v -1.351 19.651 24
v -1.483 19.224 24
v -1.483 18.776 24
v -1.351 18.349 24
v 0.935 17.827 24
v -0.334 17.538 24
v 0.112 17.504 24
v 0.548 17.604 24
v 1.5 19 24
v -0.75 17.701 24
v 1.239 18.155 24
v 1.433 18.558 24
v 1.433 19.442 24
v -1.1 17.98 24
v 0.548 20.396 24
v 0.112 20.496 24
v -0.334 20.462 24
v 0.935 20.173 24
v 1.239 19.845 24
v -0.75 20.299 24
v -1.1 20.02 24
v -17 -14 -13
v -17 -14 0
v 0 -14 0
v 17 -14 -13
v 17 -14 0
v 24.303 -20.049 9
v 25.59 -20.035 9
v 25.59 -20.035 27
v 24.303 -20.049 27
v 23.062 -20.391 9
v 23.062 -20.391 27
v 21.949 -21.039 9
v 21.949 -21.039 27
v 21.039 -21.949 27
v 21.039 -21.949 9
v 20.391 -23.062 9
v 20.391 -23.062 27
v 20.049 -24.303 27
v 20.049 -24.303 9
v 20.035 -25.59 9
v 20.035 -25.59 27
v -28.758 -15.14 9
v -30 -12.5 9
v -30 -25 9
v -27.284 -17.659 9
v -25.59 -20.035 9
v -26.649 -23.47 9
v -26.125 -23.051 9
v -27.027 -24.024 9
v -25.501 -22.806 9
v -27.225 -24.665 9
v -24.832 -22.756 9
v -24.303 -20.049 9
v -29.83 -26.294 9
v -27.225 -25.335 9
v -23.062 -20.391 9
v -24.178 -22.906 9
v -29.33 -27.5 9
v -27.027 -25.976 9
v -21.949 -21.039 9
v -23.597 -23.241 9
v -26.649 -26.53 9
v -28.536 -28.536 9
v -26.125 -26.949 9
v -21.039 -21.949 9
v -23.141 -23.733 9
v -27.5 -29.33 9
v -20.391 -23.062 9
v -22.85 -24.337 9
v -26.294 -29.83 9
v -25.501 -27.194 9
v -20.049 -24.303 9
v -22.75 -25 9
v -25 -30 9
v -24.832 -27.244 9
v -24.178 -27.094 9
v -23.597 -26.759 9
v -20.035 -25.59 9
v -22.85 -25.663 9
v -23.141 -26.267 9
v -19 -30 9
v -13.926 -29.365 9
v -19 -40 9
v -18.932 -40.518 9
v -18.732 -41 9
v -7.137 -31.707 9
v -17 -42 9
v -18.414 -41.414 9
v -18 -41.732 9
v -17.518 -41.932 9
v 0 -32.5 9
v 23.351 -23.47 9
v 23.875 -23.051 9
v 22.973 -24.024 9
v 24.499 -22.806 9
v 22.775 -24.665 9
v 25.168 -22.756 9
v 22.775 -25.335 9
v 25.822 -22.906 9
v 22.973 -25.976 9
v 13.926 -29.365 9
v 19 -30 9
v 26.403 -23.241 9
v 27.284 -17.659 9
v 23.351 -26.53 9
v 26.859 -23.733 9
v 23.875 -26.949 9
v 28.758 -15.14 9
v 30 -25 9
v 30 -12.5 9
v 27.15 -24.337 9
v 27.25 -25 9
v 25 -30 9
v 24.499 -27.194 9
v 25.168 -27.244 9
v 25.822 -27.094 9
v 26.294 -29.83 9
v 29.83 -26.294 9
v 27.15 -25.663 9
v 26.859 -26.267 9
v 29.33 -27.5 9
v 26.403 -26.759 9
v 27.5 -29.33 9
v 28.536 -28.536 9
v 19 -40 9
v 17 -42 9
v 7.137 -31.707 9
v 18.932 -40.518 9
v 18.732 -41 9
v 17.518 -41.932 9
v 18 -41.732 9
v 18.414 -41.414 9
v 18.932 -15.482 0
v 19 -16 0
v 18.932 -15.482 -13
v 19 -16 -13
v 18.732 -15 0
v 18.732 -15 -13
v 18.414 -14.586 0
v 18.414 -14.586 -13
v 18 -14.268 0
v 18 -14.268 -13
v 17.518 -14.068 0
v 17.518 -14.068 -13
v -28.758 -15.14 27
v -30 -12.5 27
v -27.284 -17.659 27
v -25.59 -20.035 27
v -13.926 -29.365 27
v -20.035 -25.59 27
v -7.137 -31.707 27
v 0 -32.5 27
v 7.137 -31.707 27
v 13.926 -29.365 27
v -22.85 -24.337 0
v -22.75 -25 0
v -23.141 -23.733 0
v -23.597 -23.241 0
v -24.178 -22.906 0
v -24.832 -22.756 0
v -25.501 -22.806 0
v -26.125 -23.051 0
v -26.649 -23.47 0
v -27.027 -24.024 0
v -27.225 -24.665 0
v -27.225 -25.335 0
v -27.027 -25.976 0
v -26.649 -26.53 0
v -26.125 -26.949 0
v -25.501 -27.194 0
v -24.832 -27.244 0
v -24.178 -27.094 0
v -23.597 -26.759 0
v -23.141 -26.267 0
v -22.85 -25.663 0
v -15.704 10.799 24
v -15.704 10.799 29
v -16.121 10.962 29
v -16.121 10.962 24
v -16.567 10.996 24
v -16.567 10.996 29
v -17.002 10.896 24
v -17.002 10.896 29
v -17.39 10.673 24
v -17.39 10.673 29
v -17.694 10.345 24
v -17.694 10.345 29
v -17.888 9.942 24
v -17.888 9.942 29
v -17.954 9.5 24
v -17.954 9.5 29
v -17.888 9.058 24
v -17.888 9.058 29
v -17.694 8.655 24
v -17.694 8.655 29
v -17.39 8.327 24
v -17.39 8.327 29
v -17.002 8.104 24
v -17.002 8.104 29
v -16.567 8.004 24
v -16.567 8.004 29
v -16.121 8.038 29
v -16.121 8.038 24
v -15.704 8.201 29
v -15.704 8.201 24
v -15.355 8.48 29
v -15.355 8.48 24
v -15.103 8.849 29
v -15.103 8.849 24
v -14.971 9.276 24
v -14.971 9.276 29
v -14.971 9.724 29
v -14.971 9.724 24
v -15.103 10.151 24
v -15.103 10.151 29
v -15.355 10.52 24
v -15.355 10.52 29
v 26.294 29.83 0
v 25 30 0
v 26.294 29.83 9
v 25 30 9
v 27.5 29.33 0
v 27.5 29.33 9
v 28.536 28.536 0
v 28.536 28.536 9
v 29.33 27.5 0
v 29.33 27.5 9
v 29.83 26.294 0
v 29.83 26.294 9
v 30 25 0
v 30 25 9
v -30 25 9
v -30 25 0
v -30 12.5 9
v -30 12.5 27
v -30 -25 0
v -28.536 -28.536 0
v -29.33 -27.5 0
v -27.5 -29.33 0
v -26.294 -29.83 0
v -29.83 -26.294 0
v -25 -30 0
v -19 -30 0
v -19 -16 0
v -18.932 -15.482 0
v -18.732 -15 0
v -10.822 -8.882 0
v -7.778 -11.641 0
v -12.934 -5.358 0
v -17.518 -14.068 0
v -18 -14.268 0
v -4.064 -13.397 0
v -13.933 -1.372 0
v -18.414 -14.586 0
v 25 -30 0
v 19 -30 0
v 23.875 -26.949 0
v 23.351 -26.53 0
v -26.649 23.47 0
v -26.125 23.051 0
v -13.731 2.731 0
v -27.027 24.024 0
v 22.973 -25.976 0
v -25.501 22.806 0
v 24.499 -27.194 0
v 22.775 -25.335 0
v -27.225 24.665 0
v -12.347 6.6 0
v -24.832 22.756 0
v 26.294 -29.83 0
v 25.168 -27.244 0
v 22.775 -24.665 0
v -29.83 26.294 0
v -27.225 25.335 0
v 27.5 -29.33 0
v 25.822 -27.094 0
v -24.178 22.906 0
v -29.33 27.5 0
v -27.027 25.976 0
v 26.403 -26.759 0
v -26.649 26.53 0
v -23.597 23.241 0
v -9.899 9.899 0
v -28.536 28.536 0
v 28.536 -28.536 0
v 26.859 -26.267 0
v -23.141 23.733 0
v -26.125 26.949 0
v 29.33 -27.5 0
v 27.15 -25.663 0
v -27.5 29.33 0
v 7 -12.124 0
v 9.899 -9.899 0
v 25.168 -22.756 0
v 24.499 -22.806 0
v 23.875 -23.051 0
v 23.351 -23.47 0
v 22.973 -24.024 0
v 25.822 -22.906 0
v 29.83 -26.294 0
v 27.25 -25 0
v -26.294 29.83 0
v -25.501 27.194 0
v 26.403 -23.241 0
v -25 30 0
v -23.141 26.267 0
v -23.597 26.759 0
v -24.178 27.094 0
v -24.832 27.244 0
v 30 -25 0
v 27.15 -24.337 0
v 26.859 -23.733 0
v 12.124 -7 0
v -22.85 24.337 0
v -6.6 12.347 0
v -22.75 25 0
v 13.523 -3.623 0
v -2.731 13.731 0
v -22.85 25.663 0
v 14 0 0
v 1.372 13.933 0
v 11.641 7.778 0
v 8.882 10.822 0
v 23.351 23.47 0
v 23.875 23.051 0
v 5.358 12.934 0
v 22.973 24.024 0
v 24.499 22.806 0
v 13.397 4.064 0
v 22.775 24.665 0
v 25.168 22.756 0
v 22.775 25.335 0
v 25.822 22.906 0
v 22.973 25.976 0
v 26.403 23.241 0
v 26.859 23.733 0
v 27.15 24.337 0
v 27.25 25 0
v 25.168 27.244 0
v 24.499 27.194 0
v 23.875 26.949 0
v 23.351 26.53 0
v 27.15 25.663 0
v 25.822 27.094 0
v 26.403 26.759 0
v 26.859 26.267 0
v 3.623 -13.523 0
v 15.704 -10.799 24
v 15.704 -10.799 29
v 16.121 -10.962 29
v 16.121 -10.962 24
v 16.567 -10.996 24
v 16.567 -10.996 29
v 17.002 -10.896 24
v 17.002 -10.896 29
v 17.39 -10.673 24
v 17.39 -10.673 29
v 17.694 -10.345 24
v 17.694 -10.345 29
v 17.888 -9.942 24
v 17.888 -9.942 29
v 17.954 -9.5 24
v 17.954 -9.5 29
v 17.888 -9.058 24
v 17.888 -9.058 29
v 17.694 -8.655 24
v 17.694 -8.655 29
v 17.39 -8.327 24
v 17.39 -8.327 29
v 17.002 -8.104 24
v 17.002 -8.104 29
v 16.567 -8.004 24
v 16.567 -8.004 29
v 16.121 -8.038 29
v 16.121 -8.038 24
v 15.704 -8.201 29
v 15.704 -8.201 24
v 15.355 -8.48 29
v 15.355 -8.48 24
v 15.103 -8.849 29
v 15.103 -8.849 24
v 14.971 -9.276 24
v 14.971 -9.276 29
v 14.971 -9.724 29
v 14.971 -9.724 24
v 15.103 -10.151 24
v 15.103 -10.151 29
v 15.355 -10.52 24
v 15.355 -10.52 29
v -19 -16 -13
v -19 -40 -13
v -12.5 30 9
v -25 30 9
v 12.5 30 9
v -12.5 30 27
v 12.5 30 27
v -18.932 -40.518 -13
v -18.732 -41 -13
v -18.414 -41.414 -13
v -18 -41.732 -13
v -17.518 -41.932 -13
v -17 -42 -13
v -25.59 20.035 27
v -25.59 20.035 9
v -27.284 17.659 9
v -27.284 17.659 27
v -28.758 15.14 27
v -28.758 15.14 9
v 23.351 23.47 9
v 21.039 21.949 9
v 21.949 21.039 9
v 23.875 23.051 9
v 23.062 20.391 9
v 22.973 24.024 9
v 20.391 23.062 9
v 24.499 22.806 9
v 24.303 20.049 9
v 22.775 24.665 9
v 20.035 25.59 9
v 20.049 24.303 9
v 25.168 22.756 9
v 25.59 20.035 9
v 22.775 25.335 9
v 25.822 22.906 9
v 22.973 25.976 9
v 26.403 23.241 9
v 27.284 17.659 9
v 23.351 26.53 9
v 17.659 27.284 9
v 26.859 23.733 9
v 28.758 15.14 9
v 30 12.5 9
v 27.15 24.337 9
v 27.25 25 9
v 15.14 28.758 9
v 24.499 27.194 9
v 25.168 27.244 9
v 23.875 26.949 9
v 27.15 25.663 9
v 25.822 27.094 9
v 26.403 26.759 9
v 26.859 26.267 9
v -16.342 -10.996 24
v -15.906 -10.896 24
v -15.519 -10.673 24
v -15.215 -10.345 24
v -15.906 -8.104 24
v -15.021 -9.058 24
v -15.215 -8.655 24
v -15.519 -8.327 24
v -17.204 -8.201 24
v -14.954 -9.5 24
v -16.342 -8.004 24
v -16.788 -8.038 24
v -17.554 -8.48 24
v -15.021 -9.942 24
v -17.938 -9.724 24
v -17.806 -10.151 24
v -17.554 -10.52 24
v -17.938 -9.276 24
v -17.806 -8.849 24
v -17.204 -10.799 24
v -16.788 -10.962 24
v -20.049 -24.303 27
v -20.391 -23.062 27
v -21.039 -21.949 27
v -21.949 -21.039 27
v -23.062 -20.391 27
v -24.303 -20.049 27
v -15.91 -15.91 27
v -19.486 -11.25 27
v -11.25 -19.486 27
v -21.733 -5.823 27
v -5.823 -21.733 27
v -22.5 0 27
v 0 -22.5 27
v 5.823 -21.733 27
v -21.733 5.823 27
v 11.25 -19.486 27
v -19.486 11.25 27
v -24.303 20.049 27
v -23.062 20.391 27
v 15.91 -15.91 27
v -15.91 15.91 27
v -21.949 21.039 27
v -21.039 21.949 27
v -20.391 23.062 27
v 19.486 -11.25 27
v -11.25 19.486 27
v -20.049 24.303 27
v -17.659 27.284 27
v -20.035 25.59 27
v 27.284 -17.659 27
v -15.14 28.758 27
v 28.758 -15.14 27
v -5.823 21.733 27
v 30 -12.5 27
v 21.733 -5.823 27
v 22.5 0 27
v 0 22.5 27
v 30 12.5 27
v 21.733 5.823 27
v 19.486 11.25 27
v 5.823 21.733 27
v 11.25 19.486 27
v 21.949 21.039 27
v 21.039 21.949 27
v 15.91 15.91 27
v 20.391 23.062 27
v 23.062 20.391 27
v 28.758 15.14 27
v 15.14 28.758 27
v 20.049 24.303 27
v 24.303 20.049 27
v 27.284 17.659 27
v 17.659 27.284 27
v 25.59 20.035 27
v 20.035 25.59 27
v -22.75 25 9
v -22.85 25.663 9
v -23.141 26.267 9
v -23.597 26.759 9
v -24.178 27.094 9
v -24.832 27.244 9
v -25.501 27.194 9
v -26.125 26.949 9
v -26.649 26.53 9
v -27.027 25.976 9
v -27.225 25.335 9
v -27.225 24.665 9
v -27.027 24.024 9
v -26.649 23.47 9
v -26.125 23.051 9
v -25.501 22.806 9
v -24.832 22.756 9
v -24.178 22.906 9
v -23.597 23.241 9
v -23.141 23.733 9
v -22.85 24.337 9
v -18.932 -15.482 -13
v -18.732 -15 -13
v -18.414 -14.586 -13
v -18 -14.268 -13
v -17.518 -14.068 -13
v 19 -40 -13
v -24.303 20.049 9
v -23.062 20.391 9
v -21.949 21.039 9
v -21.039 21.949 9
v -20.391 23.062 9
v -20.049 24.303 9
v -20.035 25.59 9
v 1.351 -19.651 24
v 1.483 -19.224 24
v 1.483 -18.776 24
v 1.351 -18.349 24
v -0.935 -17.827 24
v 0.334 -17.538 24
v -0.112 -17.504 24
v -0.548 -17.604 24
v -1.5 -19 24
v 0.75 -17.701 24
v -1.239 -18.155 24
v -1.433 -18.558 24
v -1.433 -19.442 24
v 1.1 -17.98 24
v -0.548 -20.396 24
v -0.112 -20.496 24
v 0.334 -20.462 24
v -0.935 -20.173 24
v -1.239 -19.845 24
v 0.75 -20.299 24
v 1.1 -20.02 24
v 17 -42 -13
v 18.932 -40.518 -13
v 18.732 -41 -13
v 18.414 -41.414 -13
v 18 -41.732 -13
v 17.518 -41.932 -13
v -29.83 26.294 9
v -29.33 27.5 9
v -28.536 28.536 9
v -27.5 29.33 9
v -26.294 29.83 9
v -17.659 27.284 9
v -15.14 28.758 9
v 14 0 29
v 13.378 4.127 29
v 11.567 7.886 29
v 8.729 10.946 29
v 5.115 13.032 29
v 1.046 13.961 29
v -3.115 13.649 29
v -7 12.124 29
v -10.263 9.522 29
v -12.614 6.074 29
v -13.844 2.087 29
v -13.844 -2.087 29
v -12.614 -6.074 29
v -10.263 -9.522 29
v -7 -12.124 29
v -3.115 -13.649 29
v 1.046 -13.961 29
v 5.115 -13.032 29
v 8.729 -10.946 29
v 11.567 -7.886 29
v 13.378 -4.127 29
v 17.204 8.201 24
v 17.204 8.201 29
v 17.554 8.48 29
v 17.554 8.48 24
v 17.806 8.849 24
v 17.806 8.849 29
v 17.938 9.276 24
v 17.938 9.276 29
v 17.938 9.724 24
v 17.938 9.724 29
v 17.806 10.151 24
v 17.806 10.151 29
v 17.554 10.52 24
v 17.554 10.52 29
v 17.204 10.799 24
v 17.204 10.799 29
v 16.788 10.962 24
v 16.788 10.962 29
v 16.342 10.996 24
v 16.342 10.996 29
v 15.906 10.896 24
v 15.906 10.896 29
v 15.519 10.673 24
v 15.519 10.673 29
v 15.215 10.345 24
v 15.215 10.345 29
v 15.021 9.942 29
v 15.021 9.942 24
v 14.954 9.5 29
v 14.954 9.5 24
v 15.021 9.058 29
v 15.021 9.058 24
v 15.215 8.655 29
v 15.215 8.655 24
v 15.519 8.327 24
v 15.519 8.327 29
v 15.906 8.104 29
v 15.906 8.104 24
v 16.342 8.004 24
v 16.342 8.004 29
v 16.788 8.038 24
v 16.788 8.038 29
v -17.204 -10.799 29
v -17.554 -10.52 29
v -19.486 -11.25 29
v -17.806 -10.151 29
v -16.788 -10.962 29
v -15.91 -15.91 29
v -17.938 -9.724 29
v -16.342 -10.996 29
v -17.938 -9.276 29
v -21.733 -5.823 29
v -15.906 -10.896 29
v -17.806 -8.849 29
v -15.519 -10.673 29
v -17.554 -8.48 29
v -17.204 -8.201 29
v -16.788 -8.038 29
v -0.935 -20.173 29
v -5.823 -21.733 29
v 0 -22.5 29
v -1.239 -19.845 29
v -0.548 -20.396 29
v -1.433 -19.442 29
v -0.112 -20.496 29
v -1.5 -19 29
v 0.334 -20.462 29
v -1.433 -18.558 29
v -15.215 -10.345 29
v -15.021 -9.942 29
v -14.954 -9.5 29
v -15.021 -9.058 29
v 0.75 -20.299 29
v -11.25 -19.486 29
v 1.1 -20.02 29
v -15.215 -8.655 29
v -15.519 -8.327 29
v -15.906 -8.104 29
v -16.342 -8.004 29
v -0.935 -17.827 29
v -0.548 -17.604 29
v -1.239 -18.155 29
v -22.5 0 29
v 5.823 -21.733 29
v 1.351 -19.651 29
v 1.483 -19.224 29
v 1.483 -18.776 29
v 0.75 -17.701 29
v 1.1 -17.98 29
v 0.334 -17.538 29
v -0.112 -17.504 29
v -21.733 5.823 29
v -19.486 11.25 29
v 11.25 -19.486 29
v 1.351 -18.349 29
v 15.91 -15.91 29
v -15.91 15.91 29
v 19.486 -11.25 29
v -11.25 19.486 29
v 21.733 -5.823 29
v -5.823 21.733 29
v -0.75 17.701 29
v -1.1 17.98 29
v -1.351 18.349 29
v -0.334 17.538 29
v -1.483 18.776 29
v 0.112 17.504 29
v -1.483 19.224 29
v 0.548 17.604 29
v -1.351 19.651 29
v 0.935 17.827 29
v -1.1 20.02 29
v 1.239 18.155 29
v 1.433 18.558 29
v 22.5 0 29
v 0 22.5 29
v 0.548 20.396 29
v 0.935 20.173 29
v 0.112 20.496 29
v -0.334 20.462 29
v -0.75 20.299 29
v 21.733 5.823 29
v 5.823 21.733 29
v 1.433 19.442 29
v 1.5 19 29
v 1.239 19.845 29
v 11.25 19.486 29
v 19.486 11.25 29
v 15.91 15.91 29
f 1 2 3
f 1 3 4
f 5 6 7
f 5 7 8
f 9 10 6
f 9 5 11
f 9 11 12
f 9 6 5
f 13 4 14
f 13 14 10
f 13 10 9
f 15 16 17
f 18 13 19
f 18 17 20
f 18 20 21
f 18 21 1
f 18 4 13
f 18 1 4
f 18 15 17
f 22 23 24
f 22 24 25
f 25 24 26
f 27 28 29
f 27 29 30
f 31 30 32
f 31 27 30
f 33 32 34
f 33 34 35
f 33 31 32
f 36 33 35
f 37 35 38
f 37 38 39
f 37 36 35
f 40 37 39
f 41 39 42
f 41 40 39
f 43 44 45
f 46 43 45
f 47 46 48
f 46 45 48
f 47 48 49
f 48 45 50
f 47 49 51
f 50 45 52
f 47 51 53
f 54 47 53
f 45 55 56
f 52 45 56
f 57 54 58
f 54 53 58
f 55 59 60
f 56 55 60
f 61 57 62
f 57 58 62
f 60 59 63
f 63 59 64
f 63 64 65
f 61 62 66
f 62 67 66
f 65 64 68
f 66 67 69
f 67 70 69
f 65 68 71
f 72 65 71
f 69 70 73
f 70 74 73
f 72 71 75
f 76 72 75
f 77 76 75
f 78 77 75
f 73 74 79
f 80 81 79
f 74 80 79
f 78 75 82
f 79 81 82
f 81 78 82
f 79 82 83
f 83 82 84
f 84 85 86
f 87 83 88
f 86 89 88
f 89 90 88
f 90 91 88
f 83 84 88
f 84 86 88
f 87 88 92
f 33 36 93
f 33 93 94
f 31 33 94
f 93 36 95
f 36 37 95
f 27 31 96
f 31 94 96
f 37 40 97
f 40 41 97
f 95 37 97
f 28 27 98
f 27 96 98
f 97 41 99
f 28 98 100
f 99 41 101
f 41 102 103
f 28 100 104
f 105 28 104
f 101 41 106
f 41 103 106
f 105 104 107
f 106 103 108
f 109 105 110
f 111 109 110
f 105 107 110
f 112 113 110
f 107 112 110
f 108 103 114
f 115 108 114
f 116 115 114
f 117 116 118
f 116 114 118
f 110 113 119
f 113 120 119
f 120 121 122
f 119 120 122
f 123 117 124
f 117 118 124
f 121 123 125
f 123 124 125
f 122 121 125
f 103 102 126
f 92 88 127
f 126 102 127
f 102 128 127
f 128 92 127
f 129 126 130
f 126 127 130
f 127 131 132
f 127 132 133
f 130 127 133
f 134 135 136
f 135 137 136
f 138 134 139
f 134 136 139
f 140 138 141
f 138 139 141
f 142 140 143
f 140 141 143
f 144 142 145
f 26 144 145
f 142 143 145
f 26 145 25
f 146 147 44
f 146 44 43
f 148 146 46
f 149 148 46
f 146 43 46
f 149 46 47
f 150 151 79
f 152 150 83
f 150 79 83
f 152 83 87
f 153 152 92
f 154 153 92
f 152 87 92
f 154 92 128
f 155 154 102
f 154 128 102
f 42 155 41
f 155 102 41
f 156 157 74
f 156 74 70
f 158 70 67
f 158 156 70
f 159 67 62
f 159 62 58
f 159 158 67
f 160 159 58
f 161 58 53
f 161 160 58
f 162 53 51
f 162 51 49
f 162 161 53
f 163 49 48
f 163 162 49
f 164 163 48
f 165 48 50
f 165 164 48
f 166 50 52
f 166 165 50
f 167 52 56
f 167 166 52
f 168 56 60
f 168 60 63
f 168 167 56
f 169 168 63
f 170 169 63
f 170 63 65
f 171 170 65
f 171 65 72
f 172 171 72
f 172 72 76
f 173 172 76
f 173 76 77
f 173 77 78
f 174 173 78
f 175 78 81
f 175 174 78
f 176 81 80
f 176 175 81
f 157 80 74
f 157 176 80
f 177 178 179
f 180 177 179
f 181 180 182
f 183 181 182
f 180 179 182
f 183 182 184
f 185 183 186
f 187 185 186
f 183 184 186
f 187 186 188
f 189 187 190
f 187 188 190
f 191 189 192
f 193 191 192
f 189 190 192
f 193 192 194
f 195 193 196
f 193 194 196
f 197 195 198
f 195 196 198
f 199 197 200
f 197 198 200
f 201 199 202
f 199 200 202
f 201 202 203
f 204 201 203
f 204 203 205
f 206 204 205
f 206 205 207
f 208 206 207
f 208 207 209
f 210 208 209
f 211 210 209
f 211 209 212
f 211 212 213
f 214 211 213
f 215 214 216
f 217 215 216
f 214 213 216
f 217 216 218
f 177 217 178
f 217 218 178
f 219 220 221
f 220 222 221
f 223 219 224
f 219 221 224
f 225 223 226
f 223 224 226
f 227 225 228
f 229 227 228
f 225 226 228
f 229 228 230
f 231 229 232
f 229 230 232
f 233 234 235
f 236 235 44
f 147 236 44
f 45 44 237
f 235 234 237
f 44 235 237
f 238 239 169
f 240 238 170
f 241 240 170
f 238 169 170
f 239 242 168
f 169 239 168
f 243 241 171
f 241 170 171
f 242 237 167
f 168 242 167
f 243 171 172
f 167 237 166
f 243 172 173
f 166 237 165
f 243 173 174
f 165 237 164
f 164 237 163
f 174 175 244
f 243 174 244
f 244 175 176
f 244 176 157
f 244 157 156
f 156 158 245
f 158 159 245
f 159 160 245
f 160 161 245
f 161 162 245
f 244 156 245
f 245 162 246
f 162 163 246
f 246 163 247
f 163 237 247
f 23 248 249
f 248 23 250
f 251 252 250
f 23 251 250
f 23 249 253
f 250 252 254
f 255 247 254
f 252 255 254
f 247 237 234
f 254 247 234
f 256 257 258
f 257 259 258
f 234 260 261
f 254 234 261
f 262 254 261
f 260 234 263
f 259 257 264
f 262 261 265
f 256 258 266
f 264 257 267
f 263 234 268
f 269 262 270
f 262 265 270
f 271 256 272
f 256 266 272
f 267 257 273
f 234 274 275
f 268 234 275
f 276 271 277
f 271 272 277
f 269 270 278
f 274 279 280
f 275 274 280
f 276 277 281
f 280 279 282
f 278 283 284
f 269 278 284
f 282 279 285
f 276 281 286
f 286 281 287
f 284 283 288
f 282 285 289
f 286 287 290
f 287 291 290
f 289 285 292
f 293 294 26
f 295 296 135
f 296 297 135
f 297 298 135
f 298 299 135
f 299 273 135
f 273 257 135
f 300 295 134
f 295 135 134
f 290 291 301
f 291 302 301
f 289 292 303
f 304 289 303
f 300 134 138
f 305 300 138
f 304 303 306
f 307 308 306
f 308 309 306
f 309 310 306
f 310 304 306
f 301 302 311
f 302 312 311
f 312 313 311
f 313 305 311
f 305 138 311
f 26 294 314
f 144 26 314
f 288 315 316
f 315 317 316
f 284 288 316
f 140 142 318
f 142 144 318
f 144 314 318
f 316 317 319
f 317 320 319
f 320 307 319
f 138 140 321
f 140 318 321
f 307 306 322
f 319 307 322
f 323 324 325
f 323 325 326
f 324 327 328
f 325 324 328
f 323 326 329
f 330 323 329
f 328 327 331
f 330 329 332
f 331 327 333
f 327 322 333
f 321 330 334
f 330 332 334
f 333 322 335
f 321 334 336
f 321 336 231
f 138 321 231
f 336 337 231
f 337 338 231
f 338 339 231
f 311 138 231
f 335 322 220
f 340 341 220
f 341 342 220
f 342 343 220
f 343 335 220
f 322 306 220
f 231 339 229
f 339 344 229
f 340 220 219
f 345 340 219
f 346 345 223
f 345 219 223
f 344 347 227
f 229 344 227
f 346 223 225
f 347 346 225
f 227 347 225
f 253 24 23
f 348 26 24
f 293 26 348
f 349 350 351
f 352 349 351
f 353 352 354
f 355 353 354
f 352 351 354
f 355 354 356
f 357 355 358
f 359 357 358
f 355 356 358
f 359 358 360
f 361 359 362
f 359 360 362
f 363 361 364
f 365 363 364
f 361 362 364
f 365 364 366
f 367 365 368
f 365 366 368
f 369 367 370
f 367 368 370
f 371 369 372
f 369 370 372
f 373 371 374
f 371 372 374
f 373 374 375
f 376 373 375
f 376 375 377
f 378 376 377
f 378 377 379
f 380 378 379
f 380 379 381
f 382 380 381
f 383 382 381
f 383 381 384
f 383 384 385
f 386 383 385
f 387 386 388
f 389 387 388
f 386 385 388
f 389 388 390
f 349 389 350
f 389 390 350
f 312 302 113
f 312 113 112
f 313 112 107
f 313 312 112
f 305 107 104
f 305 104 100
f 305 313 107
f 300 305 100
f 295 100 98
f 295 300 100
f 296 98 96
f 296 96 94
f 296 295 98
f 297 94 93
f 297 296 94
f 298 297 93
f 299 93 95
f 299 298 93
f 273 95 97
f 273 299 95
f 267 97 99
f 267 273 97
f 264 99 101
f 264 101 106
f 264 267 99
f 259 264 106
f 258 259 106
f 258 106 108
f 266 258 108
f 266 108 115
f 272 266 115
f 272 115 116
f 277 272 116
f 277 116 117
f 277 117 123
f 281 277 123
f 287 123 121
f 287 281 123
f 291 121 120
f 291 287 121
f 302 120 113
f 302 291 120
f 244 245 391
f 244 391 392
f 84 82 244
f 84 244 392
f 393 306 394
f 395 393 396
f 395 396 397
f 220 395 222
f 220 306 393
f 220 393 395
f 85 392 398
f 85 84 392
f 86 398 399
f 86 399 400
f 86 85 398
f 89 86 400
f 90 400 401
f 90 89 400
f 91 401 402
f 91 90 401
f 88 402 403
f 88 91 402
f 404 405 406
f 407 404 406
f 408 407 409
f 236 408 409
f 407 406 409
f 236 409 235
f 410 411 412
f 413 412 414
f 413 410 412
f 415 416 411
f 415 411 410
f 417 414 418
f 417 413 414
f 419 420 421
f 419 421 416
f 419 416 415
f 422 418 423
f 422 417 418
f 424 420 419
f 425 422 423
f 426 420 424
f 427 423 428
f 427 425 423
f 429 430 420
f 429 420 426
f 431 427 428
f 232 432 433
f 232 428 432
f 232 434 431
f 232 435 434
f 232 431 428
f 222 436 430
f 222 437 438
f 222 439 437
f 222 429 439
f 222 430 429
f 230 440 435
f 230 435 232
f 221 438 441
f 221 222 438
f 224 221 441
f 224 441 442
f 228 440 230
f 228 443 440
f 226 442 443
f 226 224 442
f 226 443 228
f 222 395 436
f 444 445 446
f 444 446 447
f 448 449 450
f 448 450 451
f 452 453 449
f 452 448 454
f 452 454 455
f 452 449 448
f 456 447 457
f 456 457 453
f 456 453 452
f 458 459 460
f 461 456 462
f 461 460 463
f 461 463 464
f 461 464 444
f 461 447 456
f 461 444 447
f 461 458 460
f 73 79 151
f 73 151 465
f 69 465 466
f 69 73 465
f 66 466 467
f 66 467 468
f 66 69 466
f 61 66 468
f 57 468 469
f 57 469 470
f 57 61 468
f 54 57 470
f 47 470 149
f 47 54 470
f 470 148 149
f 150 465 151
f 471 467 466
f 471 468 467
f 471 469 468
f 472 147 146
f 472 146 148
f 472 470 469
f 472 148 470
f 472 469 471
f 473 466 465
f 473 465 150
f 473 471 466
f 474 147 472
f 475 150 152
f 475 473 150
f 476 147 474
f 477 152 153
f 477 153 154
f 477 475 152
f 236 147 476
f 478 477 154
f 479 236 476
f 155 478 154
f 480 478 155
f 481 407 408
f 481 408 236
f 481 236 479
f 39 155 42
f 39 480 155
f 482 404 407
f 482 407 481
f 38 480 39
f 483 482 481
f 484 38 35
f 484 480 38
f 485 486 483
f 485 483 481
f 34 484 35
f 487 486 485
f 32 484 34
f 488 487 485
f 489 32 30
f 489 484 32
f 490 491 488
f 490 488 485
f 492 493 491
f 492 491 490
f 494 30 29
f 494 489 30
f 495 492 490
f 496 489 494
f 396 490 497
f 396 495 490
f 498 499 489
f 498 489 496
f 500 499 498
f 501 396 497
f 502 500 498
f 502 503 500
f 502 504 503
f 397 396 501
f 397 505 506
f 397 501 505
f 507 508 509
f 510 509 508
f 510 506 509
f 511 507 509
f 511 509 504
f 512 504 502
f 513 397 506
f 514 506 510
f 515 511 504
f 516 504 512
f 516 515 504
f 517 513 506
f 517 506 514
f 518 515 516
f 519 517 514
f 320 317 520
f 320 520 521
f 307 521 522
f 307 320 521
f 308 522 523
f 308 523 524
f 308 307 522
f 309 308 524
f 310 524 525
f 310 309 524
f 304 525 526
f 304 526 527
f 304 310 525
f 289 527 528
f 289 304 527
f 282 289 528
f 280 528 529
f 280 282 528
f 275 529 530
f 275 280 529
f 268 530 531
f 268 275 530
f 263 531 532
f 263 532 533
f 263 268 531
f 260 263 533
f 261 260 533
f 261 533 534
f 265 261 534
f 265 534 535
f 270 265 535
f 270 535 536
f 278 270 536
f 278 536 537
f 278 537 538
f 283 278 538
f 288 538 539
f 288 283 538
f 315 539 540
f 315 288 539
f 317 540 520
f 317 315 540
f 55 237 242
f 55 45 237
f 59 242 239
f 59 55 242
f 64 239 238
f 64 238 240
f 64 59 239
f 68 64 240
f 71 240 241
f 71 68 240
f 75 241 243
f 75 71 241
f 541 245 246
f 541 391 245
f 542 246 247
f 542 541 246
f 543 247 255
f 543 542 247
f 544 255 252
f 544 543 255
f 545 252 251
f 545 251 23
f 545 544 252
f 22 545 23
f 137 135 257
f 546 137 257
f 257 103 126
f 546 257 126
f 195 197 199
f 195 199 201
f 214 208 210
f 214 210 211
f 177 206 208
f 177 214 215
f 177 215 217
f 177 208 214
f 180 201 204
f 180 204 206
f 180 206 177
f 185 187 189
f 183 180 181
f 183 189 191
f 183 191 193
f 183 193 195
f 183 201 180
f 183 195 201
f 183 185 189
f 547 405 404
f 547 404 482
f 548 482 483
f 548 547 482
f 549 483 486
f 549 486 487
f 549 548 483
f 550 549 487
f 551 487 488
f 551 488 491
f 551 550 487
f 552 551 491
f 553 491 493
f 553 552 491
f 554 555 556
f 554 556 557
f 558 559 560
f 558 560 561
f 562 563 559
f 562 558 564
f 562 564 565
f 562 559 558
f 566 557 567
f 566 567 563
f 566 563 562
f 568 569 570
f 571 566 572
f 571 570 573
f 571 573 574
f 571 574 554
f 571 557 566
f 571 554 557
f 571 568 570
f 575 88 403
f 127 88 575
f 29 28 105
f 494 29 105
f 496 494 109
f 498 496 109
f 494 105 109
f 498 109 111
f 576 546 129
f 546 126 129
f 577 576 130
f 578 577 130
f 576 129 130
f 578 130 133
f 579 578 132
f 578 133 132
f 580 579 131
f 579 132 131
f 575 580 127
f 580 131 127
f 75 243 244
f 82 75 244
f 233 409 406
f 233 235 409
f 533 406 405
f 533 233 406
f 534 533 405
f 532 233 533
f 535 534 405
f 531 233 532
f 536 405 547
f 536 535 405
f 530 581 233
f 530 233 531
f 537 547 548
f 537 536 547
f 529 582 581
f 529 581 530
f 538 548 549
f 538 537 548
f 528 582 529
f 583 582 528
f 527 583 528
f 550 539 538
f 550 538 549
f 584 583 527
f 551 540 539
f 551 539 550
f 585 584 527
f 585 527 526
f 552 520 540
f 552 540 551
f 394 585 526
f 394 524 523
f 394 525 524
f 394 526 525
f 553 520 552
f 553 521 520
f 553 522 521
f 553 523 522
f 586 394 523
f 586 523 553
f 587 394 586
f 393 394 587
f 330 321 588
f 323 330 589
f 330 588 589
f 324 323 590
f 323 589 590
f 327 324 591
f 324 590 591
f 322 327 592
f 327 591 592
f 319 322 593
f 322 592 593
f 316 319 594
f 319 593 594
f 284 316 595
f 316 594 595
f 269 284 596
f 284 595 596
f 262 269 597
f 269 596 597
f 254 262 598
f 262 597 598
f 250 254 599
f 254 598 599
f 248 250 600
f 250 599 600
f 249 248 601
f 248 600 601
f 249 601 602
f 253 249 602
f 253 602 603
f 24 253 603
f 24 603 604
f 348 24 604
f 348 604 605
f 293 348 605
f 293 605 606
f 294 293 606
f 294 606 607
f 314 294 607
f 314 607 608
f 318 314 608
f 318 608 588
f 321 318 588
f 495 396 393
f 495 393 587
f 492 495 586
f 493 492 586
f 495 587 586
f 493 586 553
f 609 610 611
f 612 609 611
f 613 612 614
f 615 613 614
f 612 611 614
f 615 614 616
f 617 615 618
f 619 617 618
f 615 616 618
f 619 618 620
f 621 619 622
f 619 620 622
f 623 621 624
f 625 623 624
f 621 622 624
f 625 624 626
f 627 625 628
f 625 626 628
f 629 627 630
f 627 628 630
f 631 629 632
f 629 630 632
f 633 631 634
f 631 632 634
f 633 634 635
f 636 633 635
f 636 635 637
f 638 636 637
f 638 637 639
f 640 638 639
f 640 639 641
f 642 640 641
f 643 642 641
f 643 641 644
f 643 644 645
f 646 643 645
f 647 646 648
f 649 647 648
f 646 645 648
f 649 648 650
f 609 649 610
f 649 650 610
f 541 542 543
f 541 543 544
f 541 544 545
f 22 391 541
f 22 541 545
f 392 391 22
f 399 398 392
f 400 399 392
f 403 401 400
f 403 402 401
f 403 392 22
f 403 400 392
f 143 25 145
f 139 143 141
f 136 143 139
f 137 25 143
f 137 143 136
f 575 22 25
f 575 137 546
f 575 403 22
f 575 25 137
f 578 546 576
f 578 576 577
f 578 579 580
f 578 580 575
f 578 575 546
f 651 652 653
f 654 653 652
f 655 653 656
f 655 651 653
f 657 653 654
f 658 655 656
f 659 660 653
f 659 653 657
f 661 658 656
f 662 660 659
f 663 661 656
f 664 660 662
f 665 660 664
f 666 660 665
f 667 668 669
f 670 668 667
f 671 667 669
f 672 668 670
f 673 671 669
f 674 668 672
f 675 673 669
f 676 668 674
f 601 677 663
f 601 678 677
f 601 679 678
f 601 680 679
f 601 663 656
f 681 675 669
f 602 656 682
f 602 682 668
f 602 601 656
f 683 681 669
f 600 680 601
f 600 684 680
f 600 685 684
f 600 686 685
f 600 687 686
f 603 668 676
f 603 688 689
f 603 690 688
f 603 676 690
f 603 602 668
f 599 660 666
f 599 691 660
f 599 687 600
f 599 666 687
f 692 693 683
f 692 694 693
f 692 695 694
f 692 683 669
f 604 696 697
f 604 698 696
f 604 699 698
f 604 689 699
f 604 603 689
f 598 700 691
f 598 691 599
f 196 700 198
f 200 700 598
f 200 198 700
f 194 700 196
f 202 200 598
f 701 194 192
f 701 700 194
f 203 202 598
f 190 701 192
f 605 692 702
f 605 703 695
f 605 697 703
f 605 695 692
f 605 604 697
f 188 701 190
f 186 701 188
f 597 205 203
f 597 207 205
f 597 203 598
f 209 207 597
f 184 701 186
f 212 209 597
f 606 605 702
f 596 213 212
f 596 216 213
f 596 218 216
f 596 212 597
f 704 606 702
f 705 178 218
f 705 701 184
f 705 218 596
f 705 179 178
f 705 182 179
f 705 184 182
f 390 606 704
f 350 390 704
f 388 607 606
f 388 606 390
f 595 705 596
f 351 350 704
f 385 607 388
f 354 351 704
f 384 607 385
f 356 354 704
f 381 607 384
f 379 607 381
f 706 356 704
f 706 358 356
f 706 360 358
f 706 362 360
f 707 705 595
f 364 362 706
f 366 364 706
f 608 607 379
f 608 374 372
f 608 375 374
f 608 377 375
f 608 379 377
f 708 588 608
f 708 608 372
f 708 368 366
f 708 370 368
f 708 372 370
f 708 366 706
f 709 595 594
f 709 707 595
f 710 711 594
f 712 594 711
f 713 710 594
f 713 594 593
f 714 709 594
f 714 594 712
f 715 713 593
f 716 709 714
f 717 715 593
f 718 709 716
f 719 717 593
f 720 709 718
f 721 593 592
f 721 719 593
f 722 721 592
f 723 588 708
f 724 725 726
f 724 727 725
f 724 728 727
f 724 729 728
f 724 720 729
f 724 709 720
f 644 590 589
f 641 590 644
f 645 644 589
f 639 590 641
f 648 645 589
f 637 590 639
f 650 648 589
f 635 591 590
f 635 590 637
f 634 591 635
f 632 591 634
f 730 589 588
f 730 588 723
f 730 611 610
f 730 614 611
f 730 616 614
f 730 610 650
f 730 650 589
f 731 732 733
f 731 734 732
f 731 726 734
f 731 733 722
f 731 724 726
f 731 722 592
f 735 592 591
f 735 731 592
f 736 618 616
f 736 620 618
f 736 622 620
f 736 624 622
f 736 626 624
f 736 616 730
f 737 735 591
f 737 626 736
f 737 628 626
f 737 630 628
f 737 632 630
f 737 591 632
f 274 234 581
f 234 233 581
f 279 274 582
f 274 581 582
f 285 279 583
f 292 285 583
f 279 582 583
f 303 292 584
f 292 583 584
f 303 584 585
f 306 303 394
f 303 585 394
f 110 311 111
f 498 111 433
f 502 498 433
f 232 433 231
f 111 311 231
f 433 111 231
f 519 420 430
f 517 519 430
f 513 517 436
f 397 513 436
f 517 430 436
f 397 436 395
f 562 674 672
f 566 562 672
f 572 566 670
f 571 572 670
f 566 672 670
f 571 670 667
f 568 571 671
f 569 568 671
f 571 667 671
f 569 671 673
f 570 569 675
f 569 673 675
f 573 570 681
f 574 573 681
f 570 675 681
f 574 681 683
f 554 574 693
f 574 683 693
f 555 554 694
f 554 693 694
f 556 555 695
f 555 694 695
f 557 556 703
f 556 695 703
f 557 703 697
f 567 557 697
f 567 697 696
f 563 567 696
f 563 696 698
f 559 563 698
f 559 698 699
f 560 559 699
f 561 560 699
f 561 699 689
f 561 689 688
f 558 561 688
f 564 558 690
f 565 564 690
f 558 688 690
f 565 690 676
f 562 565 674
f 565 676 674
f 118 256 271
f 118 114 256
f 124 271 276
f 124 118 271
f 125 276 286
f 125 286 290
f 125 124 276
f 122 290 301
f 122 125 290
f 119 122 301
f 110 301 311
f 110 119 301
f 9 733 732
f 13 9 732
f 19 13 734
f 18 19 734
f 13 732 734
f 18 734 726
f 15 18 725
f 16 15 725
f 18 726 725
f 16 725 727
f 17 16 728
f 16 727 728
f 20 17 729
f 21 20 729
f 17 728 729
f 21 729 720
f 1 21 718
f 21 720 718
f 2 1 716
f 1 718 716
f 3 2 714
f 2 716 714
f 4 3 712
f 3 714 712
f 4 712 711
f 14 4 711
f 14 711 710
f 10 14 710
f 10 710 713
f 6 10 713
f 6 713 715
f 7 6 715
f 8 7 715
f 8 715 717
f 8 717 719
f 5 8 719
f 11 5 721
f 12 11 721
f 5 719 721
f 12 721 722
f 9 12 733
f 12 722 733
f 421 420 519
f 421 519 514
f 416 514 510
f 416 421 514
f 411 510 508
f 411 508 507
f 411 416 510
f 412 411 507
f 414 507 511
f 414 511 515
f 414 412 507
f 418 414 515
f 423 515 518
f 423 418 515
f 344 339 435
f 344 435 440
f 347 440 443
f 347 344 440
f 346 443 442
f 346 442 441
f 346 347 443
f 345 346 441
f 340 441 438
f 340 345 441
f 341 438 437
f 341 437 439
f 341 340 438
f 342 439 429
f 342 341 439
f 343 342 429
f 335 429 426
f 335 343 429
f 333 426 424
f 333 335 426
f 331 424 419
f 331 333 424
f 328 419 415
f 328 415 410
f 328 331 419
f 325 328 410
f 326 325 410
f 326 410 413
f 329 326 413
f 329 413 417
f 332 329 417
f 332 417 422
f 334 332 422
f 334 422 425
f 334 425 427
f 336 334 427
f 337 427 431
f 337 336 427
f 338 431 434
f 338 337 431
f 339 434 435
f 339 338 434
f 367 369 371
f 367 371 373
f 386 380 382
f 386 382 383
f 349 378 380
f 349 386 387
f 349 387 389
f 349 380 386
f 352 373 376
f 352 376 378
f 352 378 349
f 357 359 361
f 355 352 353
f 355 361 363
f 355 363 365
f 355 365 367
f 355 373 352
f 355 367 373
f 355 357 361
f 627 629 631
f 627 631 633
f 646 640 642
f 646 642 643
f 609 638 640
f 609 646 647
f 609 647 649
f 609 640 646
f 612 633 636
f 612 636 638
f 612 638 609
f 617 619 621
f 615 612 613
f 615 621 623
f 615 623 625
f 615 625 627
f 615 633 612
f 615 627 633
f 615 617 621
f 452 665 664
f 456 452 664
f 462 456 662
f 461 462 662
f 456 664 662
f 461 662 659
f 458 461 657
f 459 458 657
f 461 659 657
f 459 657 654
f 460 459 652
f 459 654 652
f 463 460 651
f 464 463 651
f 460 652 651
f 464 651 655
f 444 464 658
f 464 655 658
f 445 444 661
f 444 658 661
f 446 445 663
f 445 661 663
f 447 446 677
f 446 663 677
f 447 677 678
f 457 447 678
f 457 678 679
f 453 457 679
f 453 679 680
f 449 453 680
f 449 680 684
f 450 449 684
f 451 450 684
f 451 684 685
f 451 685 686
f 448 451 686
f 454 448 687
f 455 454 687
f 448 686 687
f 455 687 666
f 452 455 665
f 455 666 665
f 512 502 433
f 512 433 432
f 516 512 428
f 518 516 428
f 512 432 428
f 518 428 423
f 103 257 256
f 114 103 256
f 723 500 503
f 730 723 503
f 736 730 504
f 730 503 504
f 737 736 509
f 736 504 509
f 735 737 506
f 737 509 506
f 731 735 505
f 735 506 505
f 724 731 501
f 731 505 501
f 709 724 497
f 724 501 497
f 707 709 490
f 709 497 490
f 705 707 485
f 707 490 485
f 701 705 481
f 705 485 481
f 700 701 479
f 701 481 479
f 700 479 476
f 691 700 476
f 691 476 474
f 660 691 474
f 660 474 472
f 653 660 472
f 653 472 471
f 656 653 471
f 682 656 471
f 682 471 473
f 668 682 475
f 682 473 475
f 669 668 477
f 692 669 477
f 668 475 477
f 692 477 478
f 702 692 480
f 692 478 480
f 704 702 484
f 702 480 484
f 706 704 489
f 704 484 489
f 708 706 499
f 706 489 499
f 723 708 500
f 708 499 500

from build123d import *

# Parameters (mm, degrees)
SKETCH_W           = 60
SKETCH_H           = 60
SKETCH_R           = 2.25
PAD_DEPTH          = 9
FILLET_R           = 5
PAD001_DEPTH       = 18
SKETCH002_R        = 22.5
PAD002_DEPTH       = 2
SKETCH003_R        = 1.5
POCKET_DEPTH       = 5
POLARPATTERN_COUNT = 6
SKETCH004_R        = 14
POCKET001_DEPTH    = 29.001
SKETCH005_W        = 38
SKETCH005_H        = 28
PAD003_DEPTH       = 13
SKETCH006_W        = 38
SKETCH006_H        = 12
PAD004_DEPTH       = 9
FILLET001_R        = 2


with BuildPart() as part:
    # Sketch → Pad (new body)
    with BuildSketch(Plane.XY):
        Rectangle(SKETCH_W, SKETCH_H)
        with Locations((-25, 25)):
            Circle(SKETCH_R, mode=Mode.SUBTRACT)
        with Locations((25, 25)):
            Circle(SKETCH_R, mode=Mode.SUBTRACT)
        with Locations((25, -25)):
            Circle(SKETCH_R, mode=Mode.SUBTRACT)
        with Locations((-25, -25)):
            Circle(SKETCH_R, mode=Mode.SUBTRACT)
    extrude(amount=PAD_DEPTH)

    # Fillet
    fillet_edges = [part.edges().sort_by_distance(p)[0] for p in [
        (30, 30, 4.5),
        (-30, 30, 4.5),
        (-30, -30, 4.5),
        (30, -30, 4.5),
    ]]
    fillet(fillet_edges, radius=FILLET_R)

    # Sketch001 (on DatumPlane) → Pad001 (join)
    with BuildSketch(Plane.XY.offset(9)):
        with BuildLine():
            ThreePointArc((-25.590061, 20.034939), (-28.049199, 16.416225), (-30, 12.5))
            Line((-30, 12.5), (-30, -12.5))
            ThreePointArc((-30, -12.5), (-28.049199, -16.416225), (-25.590061, -20.034939))
            ThreePointArc((-20.034939, -25.590061), (-21.464466, -21.464466), (-25.590061, -20.034939))
            ThreePointArc((-20.034939, -25.590061), (0, -32.5), (20.034939, -25.590061))
            ThreePointArc((25.590061, -20.034939), (21.464466, -21.464466), (20.034939, -25.590061))
            ThreePointArc((25.590061, -20.034939), (28.049199, -16.416225), (30, -12.5))
            Line((30, -12.5), (30, 12.5))
            ThreePointArc((30, 12.5), (28.049199, 16.416225), (25.590061, 20.034939))
            ThreePointArc((20.034939, 25.590061), (21.464466, 21.464466), (25.590061, 20.034939))
            ThreePointArc((20.034939, 25.590061), (16.416225, 28.049199), (12.5, 30))
            Line((12.5, 30), (-12.5, 30))
            ThreePointArc((-12.5, 30), (-16.416225, 28.049199), (-20.034939, 25.590061))
            ThreePointArc((-25.590061, 20.034939), (-21.464466, 21.464466), (-20.034939, 25.590061))
        make_face()
    extrude(amount=PAD001_DEPTH)

    # Sketch002 (on Face17 of Pad001) → Pad002 (join)
    with BuildSketch(Plane.XY.offset(27)):
        Circle(SKETCH002_R)
    extrude(amount=PAD002_DEPTH)

    # Sketch003 (on Face32 of Pad002) → Pocket (cut)
    with BuildSketch(Plane.XY.offset(29)):
        with Locations((0, 19)):
            Circle(SKETCH003_R)
    pocket = extrude(amount=-POCKET_DEPTH, mode=Mode.SUBTRACT)

    # PolarPattern: Pocket ×6 about axis
    polarpattern_axis = Axis((0, 0, 29), (0, 0, 1))
    for i in range(1, POLARPATTERN_COUNT):
        add(pocket.rotate(polarpattern_axis, i * 360 / POLARPATTERN_COUNT), mode=Mode.SUBTRACT)

    # Sketch004 (on Face32 of PolarPattern) → Pocket001 (cut, through all)
    with BuildSketch(Plane.XY.offset(29)):
        Circle(SKETCH004_R)
    extrude(amount=-POCKET001_DEPTH, mode=Mode.SUBTRACT)

    # Sketch005 (on Face1 of Pocket001) → Pad003 (join)
    with BuildSketch(Plane(origin=(0, 0, 0), x_dir=(1, 0, 0), z_dir=(0, 0, -1))):
        with Locations((0, 28)):
            Rectangle(SKETCH005_W, SKETCH005_H)
    extrude(amount=PAD003_DEPTH)

    # Sketch006 (on Face21 of Pad003) → Pad004 (join)
    with BuildSketch(Plane(origin=(0, 0, 9), x_dir=(1, 0, 0), z_dir=(0, 0, -1))):
        with Locations((0, 36)):
            Rectangle(SKETCH006_W, SKETCH006_H)
    extrude(amount=PAD004_DEPTH)

    # Fillet001
    fillet001_edges = [part.edges().sort_by_distance(p)[0] for p in [
        (-19, -14, -6.5),
        (-19, -42, -2),
        (19, -42, -2),
        (19, -14, -6.5),
    ]]
    fillet(fillet001_edges, radius=FILLET001_R)


solid = part.part
